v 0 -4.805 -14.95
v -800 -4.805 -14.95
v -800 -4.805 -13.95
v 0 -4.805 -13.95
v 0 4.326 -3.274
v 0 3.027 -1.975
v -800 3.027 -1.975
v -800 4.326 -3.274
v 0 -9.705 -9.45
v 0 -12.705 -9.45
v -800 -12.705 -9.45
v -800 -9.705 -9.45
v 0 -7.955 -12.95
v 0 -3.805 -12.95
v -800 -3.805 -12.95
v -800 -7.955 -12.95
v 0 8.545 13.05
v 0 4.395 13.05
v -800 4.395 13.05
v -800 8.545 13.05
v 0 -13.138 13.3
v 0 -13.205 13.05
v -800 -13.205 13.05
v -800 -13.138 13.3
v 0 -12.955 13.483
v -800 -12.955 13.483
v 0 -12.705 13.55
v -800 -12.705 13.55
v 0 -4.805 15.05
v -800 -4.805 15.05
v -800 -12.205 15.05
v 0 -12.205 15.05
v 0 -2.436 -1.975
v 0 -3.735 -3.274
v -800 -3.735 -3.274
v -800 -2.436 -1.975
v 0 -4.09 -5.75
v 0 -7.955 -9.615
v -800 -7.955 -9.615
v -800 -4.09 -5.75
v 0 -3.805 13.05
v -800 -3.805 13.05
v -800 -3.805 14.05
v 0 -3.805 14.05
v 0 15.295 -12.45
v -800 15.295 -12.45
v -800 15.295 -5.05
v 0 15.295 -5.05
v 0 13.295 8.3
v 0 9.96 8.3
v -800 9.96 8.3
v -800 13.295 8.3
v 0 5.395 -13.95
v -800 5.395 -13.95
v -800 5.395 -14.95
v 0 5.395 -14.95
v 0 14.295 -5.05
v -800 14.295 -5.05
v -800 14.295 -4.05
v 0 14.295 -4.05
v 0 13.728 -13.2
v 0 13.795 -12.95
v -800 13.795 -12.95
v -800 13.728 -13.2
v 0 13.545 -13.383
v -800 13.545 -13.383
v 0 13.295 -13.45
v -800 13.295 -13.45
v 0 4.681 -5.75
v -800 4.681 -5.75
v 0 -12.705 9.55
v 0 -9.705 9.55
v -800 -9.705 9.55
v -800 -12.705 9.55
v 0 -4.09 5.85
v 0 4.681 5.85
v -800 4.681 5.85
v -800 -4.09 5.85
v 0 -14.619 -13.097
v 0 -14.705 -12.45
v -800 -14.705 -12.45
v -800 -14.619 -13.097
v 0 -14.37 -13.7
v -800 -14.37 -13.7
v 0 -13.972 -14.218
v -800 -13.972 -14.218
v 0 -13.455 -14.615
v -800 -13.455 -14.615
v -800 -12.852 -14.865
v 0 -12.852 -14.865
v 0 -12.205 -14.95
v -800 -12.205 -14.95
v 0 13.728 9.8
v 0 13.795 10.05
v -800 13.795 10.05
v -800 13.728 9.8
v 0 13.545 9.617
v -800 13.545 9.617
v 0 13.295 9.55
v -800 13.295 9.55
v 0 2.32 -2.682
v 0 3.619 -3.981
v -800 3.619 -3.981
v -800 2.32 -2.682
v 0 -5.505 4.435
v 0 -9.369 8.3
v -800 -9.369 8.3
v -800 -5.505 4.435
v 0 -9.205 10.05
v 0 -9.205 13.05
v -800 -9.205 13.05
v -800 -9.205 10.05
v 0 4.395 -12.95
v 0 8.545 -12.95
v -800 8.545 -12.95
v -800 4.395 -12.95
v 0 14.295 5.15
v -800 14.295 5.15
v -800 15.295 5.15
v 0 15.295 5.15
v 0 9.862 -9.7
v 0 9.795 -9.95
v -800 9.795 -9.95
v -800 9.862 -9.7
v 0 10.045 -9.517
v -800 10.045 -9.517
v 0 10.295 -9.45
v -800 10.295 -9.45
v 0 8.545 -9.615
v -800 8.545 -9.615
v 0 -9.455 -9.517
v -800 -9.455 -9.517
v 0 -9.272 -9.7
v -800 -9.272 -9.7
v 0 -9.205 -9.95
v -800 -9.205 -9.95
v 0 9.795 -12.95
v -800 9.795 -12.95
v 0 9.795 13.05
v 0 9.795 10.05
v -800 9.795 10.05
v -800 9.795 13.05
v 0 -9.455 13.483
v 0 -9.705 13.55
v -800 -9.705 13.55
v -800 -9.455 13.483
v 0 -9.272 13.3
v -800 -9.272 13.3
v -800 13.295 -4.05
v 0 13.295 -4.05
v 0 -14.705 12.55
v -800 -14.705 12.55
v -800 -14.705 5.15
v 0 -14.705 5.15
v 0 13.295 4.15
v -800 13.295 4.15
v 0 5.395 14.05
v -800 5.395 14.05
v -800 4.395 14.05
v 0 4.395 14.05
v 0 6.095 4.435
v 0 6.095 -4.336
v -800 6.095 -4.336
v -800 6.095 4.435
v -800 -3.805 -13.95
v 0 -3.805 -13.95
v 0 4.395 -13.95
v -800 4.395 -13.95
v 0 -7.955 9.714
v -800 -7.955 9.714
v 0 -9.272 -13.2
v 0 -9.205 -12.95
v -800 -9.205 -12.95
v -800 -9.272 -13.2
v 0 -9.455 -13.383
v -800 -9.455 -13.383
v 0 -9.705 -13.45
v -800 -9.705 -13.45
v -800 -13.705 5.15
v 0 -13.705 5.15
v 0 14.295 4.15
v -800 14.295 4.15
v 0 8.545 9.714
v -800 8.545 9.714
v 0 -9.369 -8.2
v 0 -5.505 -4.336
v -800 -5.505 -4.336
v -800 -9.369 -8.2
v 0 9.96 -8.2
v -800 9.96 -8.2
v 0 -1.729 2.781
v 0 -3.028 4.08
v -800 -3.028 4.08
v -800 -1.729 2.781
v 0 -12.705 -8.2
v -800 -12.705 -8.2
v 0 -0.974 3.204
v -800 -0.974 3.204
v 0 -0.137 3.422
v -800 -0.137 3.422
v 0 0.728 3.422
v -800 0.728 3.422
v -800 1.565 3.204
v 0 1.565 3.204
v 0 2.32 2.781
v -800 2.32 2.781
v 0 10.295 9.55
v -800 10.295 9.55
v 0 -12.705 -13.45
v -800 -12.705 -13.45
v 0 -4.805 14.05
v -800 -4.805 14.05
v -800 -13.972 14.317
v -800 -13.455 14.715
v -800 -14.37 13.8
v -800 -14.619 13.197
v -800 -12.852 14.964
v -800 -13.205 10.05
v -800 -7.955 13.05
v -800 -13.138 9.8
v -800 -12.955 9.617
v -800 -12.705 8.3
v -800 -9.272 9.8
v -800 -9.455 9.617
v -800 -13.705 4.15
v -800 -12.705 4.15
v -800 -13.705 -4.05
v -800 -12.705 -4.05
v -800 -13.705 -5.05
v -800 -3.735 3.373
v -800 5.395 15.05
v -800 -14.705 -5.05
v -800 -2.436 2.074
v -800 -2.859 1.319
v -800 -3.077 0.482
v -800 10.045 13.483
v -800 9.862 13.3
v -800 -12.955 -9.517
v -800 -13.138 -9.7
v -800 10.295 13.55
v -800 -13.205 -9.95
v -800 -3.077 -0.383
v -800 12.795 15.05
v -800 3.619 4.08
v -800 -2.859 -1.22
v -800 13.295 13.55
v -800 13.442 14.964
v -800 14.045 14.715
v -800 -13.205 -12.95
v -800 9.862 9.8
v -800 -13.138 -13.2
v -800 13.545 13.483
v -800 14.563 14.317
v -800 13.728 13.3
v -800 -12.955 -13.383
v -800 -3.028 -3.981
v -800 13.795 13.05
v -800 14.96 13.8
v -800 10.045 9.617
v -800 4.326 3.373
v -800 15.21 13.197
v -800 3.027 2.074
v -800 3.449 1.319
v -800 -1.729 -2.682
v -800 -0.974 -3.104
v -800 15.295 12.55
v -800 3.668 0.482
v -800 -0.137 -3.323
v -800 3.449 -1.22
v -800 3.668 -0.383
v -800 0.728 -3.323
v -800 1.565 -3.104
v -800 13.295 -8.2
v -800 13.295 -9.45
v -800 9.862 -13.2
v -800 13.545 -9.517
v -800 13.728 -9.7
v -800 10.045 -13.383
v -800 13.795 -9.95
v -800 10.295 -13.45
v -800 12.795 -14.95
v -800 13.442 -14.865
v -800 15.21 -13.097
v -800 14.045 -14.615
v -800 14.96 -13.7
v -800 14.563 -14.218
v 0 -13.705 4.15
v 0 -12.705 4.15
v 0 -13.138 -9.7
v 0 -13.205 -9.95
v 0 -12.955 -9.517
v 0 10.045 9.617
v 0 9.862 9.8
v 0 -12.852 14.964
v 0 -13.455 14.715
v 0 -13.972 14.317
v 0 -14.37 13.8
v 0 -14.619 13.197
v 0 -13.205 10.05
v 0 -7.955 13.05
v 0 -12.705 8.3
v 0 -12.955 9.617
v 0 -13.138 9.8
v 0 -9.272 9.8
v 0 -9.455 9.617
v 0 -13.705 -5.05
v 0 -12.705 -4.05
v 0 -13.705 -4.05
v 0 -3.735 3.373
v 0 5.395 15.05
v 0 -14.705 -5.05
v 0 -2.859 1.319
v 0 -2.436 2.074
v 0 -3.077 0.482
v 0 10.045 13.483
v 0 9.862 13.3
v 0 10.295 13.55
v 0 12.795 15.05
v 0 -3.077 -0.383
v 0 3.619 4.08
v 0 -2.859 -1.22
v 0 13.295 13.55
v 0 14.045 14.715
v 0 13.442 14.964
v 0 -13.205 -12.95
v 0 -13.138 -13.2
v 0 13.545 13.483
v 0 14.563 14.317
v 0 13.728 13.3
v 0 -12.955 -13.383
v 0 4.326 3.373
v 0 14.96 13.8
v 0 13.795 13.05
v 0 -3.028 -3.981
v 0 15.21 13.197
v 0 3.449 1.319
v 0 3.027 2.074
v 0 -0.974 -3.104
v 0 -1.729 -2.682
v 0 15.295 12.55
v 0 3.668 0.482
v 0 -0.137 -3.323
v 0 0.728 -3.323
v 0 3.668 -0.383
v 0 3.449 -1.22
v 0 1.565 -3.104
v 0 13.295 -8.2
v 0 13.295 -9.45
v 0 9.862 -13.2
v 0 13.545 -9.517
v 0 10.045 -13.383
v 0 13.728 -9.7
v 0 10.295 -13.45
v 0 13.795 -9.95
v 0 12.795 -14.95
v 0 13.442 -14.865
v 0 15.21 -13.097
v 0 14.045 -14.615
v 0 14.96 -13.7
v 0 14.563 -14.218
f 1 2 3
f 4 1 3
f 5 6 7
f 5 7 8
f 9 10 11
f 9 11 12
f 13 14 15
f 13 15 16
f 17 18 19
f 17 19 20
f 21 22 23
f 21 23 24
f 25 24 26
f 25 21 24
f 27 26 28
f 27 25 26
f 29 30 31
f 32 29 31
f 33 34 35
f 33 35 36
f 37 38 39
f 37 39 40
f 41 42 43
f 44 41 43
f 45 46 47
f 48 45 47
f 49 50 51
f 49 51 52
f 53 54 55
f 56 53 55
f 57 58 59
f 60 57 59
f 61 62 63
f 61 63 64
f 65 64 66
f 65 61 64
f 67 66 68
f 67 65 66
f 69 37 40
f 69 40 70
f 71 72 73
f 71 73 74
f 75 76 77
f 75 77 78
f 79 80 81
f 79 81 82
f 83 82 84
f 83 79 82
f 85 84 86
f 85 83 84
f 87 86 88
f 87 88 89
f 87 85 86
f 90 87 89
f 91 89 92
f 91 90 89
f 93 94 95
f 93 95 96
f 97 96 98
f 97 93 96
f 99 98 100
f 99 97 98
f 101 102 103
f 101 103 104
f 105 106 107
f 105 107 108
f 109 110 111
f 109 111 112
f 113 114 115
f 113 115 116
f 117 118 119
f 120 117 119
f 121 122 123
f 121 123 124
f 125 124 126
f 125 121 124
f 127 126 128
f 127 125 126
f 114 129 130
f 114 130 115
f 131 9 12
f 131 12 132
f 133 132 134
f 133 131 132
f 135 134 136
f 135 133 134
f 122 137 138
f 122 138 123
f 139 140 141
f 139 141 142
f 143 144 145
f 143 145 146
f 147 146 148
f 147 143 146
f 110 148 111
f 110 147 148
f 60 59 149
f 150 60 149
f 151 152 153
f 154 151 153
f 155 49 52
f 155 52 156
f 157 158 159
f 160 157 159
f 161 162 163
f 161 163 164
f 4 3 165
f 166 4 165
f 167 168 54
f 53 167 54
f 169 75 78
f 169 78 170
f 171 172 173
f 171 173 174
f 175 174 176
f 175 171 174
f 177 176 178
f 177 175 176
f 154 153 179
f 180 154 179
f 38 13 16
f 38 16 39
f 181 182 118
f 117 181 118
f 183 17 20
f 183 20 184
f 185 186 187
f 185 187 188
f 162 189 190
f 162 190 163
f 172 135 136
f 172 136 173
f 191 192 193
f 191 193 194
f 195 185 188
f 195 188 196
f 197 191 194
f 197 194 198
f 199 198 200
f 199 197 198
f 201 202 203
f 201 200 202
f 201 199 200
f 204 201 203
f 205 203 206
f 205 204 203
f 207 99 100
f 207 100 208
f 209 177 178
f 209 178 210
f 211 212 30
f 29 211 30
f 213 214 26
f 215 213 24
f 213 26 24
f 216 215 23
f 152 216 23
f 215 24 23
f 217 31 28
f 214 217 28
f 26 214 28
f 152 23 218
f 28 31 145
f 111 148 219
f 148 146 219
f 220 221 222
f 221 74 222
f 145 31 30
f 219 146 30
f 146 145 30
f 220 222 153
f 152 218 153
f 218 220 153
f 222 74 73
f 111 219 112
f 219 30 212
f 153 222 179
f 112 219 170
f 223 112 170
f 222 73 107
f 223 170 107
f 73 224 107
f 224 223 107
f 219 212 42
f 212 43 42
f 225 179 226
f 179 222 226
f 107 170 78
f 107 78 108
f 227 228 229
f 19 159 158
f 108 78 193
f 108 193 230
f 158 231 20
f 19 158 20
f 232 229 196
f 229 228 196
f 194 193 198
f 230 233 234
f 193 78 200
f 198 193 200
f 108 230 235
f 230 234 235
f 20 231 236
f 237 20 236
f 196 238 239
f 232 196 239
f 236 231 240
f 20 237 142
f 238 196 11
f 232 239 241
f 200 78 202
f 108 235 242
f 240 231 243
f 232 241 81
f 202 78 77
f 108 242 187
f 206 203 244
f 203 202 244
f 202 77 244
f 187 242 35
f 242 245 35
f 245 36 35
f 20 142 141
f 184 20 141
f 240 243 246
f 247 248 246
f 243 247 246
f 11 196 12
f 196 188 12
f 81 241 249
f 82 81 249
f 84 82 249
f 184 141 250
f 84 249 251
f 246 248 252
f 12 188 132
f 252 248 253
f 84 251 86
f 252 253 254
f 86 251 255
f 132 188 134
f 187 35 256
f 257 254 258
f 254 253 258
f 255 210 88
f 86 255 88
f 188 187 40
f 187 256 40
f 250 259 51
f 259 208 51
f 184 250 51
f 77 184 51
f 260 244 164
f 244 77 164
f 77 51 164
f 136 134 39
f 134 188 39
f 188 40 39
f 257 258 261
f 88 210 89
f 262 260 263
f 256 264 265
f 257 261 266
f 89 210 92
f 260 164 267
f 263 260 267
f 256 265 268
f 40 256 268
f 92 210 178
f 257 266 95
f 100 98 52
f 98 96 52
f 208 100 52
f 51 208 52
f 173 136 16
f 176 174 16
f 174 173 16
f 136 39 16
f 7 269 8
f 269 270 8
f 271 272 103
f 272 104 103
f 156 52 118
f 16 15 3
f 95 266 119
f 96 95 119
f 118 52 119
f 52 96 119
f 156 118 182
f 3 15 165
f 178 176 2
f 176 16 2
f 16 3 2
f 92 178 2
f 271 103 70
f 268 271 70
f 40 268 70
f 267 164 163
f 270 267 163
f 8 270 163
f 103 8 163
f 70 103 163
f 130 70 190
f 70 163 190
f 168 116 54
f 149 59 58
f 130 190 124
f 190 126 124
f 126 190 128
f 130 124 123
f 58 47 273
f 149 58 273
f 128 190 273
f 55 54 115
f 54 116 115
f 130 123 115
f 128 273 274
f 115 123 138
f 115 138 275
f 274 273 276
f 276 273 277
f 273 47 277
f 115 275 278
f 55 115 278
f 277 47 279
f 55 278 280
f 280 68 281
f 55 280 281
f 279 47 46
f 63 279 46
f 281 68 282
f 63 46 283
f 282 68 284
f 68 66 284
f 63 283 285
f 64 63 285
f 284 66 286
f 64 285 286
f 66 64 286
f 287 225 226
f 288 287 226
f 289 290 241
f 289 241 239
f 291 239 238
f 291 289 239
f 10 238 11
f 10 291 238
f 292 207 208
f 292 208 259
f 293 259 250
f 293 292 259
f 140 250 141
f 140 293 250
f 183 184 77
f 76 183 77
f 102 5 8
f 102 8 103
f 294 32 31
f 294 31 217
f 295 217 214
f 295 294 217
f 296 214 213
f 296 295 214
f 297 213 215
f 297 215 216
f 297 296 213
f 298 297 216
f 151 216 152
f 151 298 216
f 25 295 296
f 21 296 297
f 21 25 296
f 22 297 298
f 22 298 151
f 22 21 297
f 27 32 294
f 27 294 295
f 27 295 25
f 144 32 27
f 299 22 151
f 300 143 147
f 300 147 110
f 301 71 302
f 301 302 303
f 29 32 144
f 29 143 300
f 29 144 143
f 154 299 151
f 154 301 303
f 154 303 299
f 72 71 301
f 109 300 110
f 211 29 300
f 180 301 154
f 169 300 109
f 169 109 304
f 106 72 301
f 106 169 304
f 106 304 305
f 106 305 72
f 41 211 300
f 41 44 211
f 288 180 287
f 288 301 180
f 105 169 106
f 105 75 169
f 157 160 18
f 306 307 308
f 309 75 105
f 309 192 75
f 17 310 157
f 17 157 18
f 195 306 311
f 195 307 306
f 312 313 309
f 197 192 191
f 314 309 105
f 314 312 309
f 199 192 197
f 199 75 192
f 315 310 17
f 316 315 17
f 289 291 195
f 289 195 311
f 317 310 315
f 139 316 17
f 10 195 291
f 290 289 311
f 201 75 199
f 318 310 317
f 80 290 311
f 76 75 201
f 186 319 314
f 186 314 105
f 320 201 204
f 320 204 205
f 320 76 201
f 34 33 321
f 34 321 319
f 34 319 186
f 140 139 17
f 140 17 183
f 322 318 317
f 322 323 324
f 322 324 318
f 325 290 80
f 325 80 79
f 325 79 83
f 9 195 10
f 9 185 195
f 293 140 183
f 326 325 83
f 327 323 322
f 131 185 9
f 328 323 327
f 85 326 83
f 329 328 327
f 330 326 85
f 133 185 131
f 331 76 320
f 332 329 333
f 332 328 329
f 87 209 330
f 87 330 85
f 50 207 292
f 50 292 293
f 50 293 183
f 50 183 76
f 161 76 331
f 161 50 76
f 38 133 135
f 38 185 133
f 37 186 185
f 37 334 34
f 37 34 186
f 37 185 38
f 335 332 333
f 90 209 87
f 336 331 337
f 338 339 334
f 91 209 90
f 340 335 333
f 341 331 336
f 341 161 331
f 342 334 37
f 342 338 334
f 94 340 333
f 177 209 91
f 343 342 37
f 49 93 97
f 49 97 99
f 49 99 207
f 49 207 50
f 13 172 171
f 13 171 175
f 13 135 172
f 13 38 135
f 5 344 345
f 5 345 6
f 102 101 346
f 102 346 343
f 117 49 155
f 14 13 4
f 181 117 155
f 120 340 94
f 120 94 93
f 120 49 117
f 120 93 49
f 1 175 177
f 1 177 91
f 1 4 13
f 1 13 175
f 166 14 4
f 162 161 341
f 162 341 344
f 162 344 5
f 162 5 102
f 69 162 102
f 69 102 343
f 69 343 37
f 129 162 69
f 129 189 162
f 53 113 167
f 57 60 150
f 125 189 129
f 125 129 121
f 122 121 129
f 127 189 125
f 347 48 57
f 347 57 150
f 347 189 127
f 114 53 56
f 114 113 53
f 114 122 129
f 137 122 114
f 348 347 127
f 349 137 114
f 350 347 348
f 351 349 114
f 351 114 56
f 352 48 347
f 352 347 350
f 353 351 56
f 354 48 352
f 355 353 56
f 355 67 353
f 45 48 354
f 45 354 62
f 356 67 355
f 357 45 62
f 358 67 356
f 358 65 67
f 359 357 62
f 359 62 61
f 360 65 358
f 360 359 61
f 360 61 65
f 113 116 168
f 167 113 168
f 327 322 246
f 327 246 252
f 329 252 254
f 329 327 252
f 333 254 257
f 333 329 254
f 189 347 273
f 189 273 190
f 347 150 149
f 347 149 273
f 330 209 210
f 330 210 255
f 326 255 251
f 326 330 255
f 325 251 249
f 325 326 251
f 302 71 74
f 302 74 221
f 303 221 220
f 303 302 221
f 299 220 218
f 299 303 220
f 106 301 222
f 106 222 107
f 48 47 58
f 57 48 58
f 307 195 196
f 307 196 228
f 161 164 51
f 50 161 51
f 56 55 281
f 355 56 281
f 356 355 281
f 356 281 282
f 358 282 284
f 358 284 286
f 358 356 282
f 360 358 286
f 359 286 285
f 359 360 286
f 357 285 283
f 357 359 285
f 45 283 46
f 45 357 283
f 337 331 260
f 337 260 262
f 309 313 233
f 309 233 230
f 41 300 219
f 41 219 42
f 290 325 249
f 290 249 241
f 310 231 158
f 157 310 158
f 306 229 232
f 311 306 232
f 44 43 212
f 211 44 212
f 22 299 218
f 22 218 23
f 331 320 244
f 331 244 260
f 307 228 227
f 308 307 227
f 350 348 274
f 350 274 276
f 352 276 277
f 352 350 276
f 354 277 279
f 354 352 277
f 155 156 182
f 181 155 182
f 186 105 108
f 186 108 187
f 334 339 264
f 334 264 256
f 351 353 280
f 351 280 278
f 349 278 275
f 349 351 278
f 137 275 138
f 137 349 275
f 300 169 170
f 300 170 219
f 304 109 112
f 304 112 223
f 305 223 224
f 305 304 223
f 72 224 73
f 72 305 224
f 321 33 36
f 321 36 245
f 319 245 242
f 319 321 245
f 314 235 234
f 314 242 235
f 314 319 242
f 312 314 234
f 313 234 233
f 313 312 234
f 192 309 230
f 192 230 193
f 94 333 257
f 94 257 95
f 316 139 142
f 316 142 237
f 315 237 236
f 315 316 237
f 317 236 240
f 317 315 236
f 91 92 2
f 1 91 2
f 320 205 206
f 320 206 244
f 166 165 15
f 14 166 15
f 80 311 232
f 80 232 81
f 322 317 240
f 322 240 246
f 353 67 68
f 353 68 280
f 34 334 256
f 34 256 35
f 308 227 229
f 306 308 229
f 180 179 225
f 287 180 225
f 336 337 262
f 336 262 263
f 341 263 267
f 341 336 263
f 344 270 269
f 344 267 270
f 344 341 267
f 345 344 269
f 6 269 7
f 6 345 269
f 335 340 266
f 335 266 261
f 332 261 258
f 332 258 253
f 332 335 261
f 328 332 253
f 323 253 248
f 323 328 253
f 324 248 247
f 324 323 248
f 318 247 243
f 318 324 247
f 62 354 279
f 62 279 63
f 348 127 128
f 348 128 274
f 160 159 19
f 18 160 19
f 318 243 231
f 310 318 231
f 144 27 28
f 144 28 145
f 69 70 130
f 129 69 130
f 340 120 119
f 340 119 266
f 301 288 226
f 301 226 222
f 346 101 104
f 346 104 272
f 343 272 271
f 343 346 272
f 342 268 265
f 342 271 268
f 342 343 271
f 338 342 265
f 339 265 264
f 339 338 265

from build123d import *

# Parameters (mm, degrees)
EXTRUDE_1_DEPTH = 50
EXTRUDE_2_DEPTH = 800


with BuildPart() as part:
    # 草图1 → 凸台-拉伸1 (new body)
    with BuildSketch(Plane(origin=(0, 0, 0), x_dir=(0, 0, -1), z_dir=(1, 0, 0))):
        with BuildLine():
            Line((-5.14957074, -13.70467014), (-4.14957074, -13.70467014))
            Line((-4.14957074, -13.70467014), (-4.14957074, -12.70467014))
            Line((-4.14957074, -12.70467014), (-8.29957074, -12.70467014))
            Line((-8.29957074, -12.70467014), (-8.29957074, -9.3688837))
            Line((-8.29957074, -9.3688837), (-4.43535718, -5.50467014))
            Line((-4.43535718, -5.50467014), (4.3362157, -5.50467014))
            Line((4.3362157, -5.50467014), (8.20042926, -9.3688837))
            Line((8.20042926, -9.3688837), (8.20042926, -12.70467014))
            Line((8.20042926, -12.70467014), (4.05042926, -12.70467014))
            Line((4.05042926, -12.70467014), (4.05042926, -13.70467014))
            Line((4.05042926, -13.70467014), (5.05042926, -13.70467014))
            Line((5.05042926, -13.70467014), (5.05042926, -14.70467014))
            Line((5.05042926, -14.70467014), (12.45042926, -14.70467014))
            ThreePointArc((12.45042926, -14.70467014), (14.218196213, -13.972437093), (14.95042926, -12.20467014))
            Line((14.95042926, -12.20467014), (14.95042926, -4.80467014))
            Line((14.95042926, -4.80467014), (13.95042926, -4.80467014))
            Line((13.95042926, -4.80467014), (13.95042926, -3.80467014))
            Line((13.95042926, -3.80467014), (12.95042926, -3.80467014))
            Line((12.95042926, -3.80467014), (12.95042926, -7.95467014))
            Line((12.95042926, -7.95467014), (9.61464282, -7.95467014))
            Line((9.61464282, -7.95467014), (5.75042926, -4.09045658))
            Line((5.75042926, -4.09045658), (5.75042926, 4.6811163))
            Line((5.75042926, 4.6811163), (9.61464282, 8.54532986))
            Line((9.61464282, 8.54532986), (12.95042926, 8.54532986))
            Line((12.95042926, 8.54532986), (12.95042926, 4.39532986))
            Line((12.95042926, 4.39532986), (13.95042926, 4.39532986))
            Line((13.95042926, 4.39532986), (13.95042926, 5.39532986))
            Line((13.95042926, 5.39532986), (14.95042926, 5.39532986))
            Line((14.95042926, 5.39532986), (14.95042926, 12.79532986))
            ThreePointArc((14.95042926, 12.79532986), (14.218196213, 14.563096813), (12.45042926, 15.29532986))
            Line((12.45042926, 15.29532986), (5.05042926, 15.29532986))
            Line((5.05042926, 15.29532986), (5.05042926, 14.29532986))
            Line((5.05042926, 14.29532986), (4.05042926, 14.29532986))
            Line((4.05042926, 14.29532986), (4.05042926, 13.29532986))
            Line((4.05042926, 13.29532986), (8.20042926, 13.29532986))
            Line((8.20042926, 13.29532986), (8.20042926, 9.95954342))
            Line((8.20042926, 9.95954342), (4.3362157, 6.09532986))
            Line((4.3362157, 6.09532986), (-4.43535718, 6.09532986))
            Line((-4.43535718, 6.09532986), (-8.29957074, 9.95954342))
            Line((-8.29957074, 9.95954342), (-8.29957074, 13.29532986))
            Line((-8.29957074, 13.29532986), (-4.14957074, 13.29532986))
            Line((-4.14957074, 13.29532986), (-4.14957074, 14.29532986))
            Line((-4.14957074, 14.29532986), (-5.14957074, 14.29532986))
            Line((-5.14957074, 14.29532986), (-5.14957074, 15.29532986))
            Line((-5.14957074, 15.29532986), (-12.54957074, 15.29532986))
            ThreePointArc((-12.54957074, 15.29532986), (-14.317337693, 14.563096813), (-15.04957074, 12.79532986))
            Line((-15.04957074, 12.79532986), (-15.04957074, 5.39532986))
            Line((-15.04957074, 5.39532986), (-14.04957074, 5.39532986))
            Line((-14.04957074, 5.39532986), (-14.04957074, 4.39532986))
            Line((-14.04957074, 4.39532986), (-13.04957074, 4.39532986))
            Line((-13.04957074, 4.39532986), (-13.04957074, 8.54532986))
            Line((-13.04957074, 8.54532986), (-9.7137843, 8.54532986))
            Line((-9.7137843, 8.54532986), (-5.84957074, 4.6811163))
            Line((-5.84957074, 4.6811163), (-5.84957074, -4.09045658))
            Line((-5.84957074, -4.09045658), (-9.7137843, -7.95467014))
            Line((-9.7137843, -7.95467014), (-13.04957074, -7.95467014))
            Line((-13.04957074, -7.95467014), (-13.04957074, -3.80467014))
            Line((-13.04957074, -3.80467014), (-14.04957074, -3.80467014))
            Line((-14.04957074, -3.80467014), (-14.04957074, -4.80467014))
            Line((-14.04957074, -4.80467014), (-15.04957074, -4.80467014))
            Line((-15.04957074, -4.80467014), (-15.04957074, -12.20467014))
            ThreePointArc((-15.04957074, -12.20467014), (-14.317337693, -13.972437093), (-12.54957074, -14.70467014))
            Line((-12.54957074, -14.70467014), (-5.14957074, -14.70467014))
            Line((-5.14957074, -14.70467014), (-5.14957074, -13.70467014))
        make_face()
        with BuildLine():
            Line((-10.04957074, 9.79532986), (-13.04957074, 9.79532986))
            ThreePointArc((-13.04957074, 9.79532986), (-13.403124131, 9.941776469), (-13.54957074, 10.29532986))
            Line((-13.54957074, 10.29532986), (-13.54957074, 13.29532986))
            ThreePointArc((-13.54957074, 13.29532986), (-13.403124131, 13.648883251), (-13.04957074, 13.79532986))
            Line((-13.04957074, 13.79532986), (-10.04957074, 13.79532986))
            ThreePointArc((-10.04957074, 13.79532986), (-9.696017349, 13.648883251), (-9.54957074, 13.29532986))
            Line((-9.54957074, 13.29532986), (-9.54957074, 10.29532986))
            ThreePointArc((-9.54957074, 10.29532986), (-9.696017349, 9.941776469), (-10.04957074, 9.79532986))
        make_face(mode=Mode.SUBTRACT)
        with BuildLine():
            Line((-10.04957074, -13.20467014), (-13.04957074, -13.20467014))
            ThreePointArc((-13.04957074, -13.20467014), (-13.403124131, -13.058223531), (-13.54957074, -12.70467014))
            Line((-13.54957074, -12.70467014), (-13.54957074, -9.70467014))
            ThreePointArc((-13.54957074, -9.70467014), (-13.403124131, -9.351116749), (-13.04957074, -9.20467014))
            Line((-13.04957074, -9.20467014), (-10.04957074, -9.20467014))
            ThreePointArc((-10.04957074, -9.20467014), (-9.696017349, -9.351116749), (-9.54957074, -9.70467014))
            Line((-9.54957074, -9.70467014), (-9.54957074, -12.70467014))
            ThreePointArc((-9.54957074, -12.70467014), (-9.696017349, -13.058223531), (-10.04957074, -13.20467014))
        make_face(mode=Mode.SUBTRACT)
        with BuildLine():
            Line((12.95042926, 9.79532986), (9.95042926, 9.79532986))
            ThreePointArc((9.95042926, 9.79532986), (9.596875869, 9.941776469), (9.45042926, 10.29532986))
            Line((9.45042926, 10.29532986), (9.45042926, 13.29532986))
            ThreePointArc((9.45042926, 13.29532986), (9.596875869, 13.648883251), (9.95042926, 13.79532986))
            Line((9.95042926, 13.79532986), (12.95042926, 13.79532986))
            ThreePointArc((12.95042926, 13.79532986), (13.303982651, 13.648883251), (13.45042926, 13.29532986))
            Line((13.45042926, 13.29532986), (13.45042926, 10.29532986))
            ThreePointArc((13.45042926, 10.29532986), (13.303982651, 9.941776469), (12.95042926, 9.79532986))
        make_face(mode=Mode.SUBTRACT)
        with BuildLine():
            Line((13.45042926, -9.70467014), (13.45042926, -12.70467014))
            ThreePointArc((13.45042926, -12.70467014), (13.303982651, -13.058223531), (12.95042926, -13.20467014))
            Line((12.95042926, -13.20467014), (9.95042926, -13.20467014))
            ThreePointArc((9.95042926, -13.20467014), (9.596875869, -13.058223531), (9.45042926, -12.70467014))
            Line((9.45042926, -12.70467014), (9.45042926, -9.70467014))
            ThreePointArc((9.45042926, -9.70467014), (9.596875869, -9.351116749), (9.95042926, -9.20467014))
            Line((9.95042926, -9.20467014), (12.95042926, -9.20467014))
            ThreePointArc((12.95042926, -9.20467014), (13.303982651, -9.351116749), (13.45042926, -9.70467014))
        make_face(mode=Mode.SUBTRACT)
        with BuildLine():
            Line((-4.07998961, 3.61864195), (-3.37288283, 4.32574873))
            Line((-3.37288283, 4.32574873), (-2.07404174, 3.02690764))
            ThreePointArc((-2.07404174, 3.02690764), (-0.04957074, 3.69532986), (1.97490026, 3.02690764))
            Line((1.97490026, 3.02690764), (3.27374135, 4.32574873))
            Line((3.27374135, 4.32574873), (3.98084813, 3.61864195))
            Line((3.98084813, 3.61864195), (2.68200704, 2.31980086))
            ThreePointArc((2.68200704, 2.31980086), (3.35042926, 0.29532986), (2.68200704, -1.72914114))
            Line((2.68200704, -1.72914114), (3.98084813, -3.02798223))
            Line((3.98084813, -3.02798223), (3.27374135, -3.73508901))
            Line((3.27374135, -3.73508901), (1.97490026, -2.43624792))
            ThreePointArc((1.97490026, -2.43624792), (-0.04957074, -3.10467014), (-2.07404174, -2.43624792))
            Line((-2.07404174, -2.43624792), (-3.37288283, -3.73508901))
            Line((-3.37288283, -3.73508901), (-4.07998961, -3.02798223))
            Line((-4.07998961, -3.02798223), (-2.78114852, -1.72914114))
            ThreePointArc((-2.78114852, -1.72914114), (-3.44957074, 0.29532986), (-2.78114852, 2.31980086))
            Line((-2.78114852, 2.31980086), (-4.07998961, 3.61864195))
        make_face(mode=Mode.SUBTRACT)
    extrude(amount=-EXTRUDE_1_DEPTH)

    # 草图2 → 凸台-拉伸2 (add)
    with BuildSketch(Plane(origin=(0, 0, 0), x_dir=(0, 0, -1), z_dir=(1, 0, 0))):
        with BuildLine():
            Line((-15.04957074, -4.80467014), (-15.04957074, -12.20467014))
            ThreePointArc((-15.04957074, -12.20467014), (-14.317337693, -13.972437093), (-12.54957074, -14.70467014))
            Line((-12.54957074, -14.70467014), (-5.14957074, -14.70467014))
            Line((-5.14957074, -14.70467014), (-5.14957074, -13.70467014))
            Line((-5.14957074, -13.70467014), (-4.14957074, -13.70467014))
            Line((-4.14957074, -13.70467014), (-4.14957074, -12.70467014))
            Line((-4.14957074, -12.70467014), (-8.29957074, -12.70467014))
            Line((-8.29957074, -12.70467014), (-8.29957074, -9.3688837))
            Line((-8.29957074, -9.3688837), (-4.43535718, -5.50467014))
            Line((-4.43535718, -5.50467014), (4.3362157, -5.50467014))
            Line((4.3362157, -5.50467014), (8.20042926, -9.3688837))
            Line((8.20042926, -9.3688837), (8.20042926, -12.70467014))
            Line((8.20042926, -12.70467014), (4.05042926, -12.70467014))
            Line((4.05042926, -12.70467014), (4.05042926, -13.70467014))
            Line((4.05042926, -13.70467014), (5.05042926, -13.70467014))
            Line((5.05042926, -13.70467014), (5.05042926, -14.70467014))
            Line((5.05042926, -14.70467014), (12.45042926, -14.70467014))
            ThreePointArc((12.45042926, -14.70467014), (14.218196213, -13.972437093), (14.95042926, -12.20467014))
            Line((14.95042926, -12.20467014), (14.95042926, -4.80467014))
            Line((14.95042926, -4.80467014), (13.95042926, -4.80467014))
            Line((13.95042926, -4.80467014), (13.95042926, -3.80467014))
            Line((13.95042926, -3.80467014), (12.95042926, -3.80467014))
            Line((12.95042926, -3.80467014), (12.95042926, -7.95467014))
            Line((12.95042926, -7.95467014), (9.61464282, -7.95467014))
            Line((9.61464282, -7.95467014), (5.75042926, -4.09045658))
            Line((5.75042926, -4.09045658), (5.75042926, 4.6811163))
            Line((5.75042926, 4.6811163), (9.61464282, 8.54532986))
            Line((9.61464282, 8.54532986), (12.95042926, 8.54532986))
            Line((12.95042926, 8.54532986), (12.95042926, 4.39532986))
            Line((12.95042926, 4.39532986), (13.95042926, 4.39532986))
            Line((13.95042926, 4.39532986), (13.95042926, 5.39532986))
            Line((13.95042926, 5.39532986), (14.95042926, 5.39532986))
            Line((14.95042926, 5.39532986), (14.95042926, 12.79532986))
            ThreePointArc((14.95042926, 12.79532986), (14.218196213, 14.563096813), (12.45042926, 15.29532986))
            Line((12.45042926, 15.29532986), (5.05042926, 15.29532986))
            Line((5.05042926, 15.29532986), (5.05042926, 14.29532986))
            Line((5.05042926, 14.29532986), (4.05042926, 14.29532986))
            Line((4.05042926, 14.29532986), (4.05042926, 13.29532986))
            Line((4.05042926, 13.29532986), (8.20042926, 13.29532986))
            Line((8.20042926, 13.29532986), (8.20042926, 9.95954342))
            Line((8.20042926, 9.95954342), (4.3362157, 6.09532986))
            Line((4.3362157, 6.09532986), (-4.43535718, 6.09532986))
            Line((-4.43535718, 6.09532986), (-8.29957074, 9.95954342))
            Line((-8.29957074, 9.95954342), (-8.29957074, 13.29532986))
            Line((-8.29957074, 13.29532986), (-4.14957074, 13.29532986))
            Line((-4.14957074, 13.29532986), (-4.14957074, 14.29532986))
            Line((-4.14957074, 14.29532986), (-5.14957074, 14.29532986))
            Line((-5.14957074, 14.29532986), (-5.14957074, 15.29532986))
            Line((-5.14957074, 15.29532986), (-12.54957074, 15.29532986))
            ThreePointArc((-12.54957074, 15.29532986), (-14.317337693, 14.563096813), (-15.04957074, 12.79532986))
            Line((-15.04957074, 12.79532986), (-15.04957074, 5.39532986))
            Line((-15.04957074, 5.39532986), (-14.04957074, 5.39532986))
            Line((-14.04957074, 5.39532986), (-14.04957074, 4.39532986))
            Line((-14.04957074, 4.39532986), (-13.04957074, 4.39532986))
            Line((-13.04957074, 4.39532986), (-13.04957074, 8.54532986))
            Line((-13.04957074, 8.54532986), (-9.7137843, 8.54532986))
            Line((-9.7137843, 8.54532986), (-5.84957074, 4.6811163))
            Line((-5.84957074, 4.6811163), (-5.84957074, -4.09045658))
            Line((-5.84957074, -4.09045658), (-9.7137843, -7.95467014))
            Line((-9.7137843, -7.95467014), (-13.04957074, -7.95467014))
            Line((-13.04957074, -7.95467014), (-13.04957074, -3.80467014))
            Line((-13.04957074, -3.80467014), (-14.04957074, -3.80467014))
            Line((-14.04957074, -3.80467014), (-14.04957074, -4.80467014))
            Line((-14.04957074, -4.80467014), (-15.04957074, -4.80467014))
        make_face()
        with BuildLine():
            Line((-13.04957074, 9.79532986), (-10.04957074, 9.79532986))
            ThreePointArc((-10.04957074, 9.79532986), (-9.696017349, 9.941776469), (-9.54957074, 10.29532986))
            Line((-9.54957074, 10.29532986), (-9.54957074, 13.29532986))
            ThreePointArc((-9.54957074, 13.29532986), (-9.696017349, 13.648883251), (-10.04957074, 13.79532986))
            Line((-10.04957074, 13.79532986), (-13.04957074, 13.79532986))
            ThreePointArc((-13.04957074, 13.79532986), (-13.403124131, 13.648883251), (-13.54957074, 13.29532986))
            Line((-13.54957074, 13.29532986), (-13.54957074, 10.29532986))
            ThreePointArc((-13.54957074, 10.29532986), (-13.403124131, 9.941776469), (-13.04957074, 9.79532986))
        make_face(mode=Mode.SUBTRACT)
        with BuildLine():
            Line((-13.04957074, -13.20467014), (-10.04957074, -13.20467014))
            ThreePointArc((-10.04957074, -13.20467014), (-9.696017349, -13.058223531), (-9.54957074, -12.70467014))
            Line((-9.54957074, -12.70467014), (-9.54957074, -9.70467014))
            ThreePointArc((-9.54957074, -9.70467014), (-9.696017349, -9.351116749), (-10.04957074, -9.20467014))
            Line((-10.04957074, -9.20467014), (-13.04957074, -9.20467014))
            ThreePointArc((-13.04957074, -9.20467014), (-13.403124131, -9.351116749), (-13.54957074, -9.70467014))
            Line((-13.54957074, -9.70467014), (-13.54957074, -12.70467014))
            ThreePointArc((-13.54957074, -12.70467014), (-13.403124131, -13.058223531), (-13.04957074, -13.20467014))
        make_face(mode=Mode.SUBTRACT)
        with BuildLine():
            Line((9.45042926, 13.29532986), (9.45042926, 10.29532986))
            ThreePointArc((9.45042926, 10.29532986), (9.596875869, 9.941776469), (9.95042926, 9.79532986))
            Line((9.95042926, 9.79532986), (12.95042926, 9.79532986))
            ThreePointArc((12.95042926, 9.79532986), (13.303982651, 9.941776469), (13.45042926, 10.29532986))
            Line((13.45042926, 10.29532986), (13.45042926, 13.29532986))
            ThreePointArc((13.45042926, 13.29532986), (13.303982651, 13.648883251), (12.95042926, 13.79532986))
            Line((12.95042926, 13.79532986), (9.95042926, 13.79532986))
            ThreePointArc((9.95042926, 13.79532986), (9.596875869, 13.648883251), (9.45042926, 13.29532986))
        make_face(mode=Mode.SUBTRACT)
        with BuildLine():
            Line((9.45042926, -9.70467014), (9.45042926, -12.70467014))
            ThreePointArc((9.45042926, -12.70467014), (9.596875869, -13.058223531), (9.95042926, -13.20467014))
            Line((9.95042926, -13.20467014), (12.95042926, -13.20467014))
            ThreePointArc((12.95042926, -13.20467014), (13.303982651, -13.058223531), (13.45042926, -12.70467014))
            Line((13.45042926, -12.70467014), (13.45042926, -9.70467014))
            ThreePointArc((13.45042926, -9.70467014), (13.303982651, -9.351116749), (12.95042926, -9.20467014))
            Line((12.95042926, -9.20467014), (9.95042926, -9.20467014))
            ThreePointArc((9.95042926, -9.20467014), (9.596875869, -9.351116749), (9.45042926, -9.70467014))
        make_face(mode=Mode.SUBTRACT)
        with BuildLine():
            Line((-3.37288283, -3.73508901), (-2.07404174, -2.43624792))
            ThreePointArc((-2.07404174, -2.43624792), (-0.04957074, -3.10467014), (1.97490026, -2.43624792))
            Line((1.97490026, -2.43624792), (3.27374135, -3.73508901))
            Line((3.27374135, -3.73508901), (3.98084813, -3.02798223))
            Line((3.98084813, -3.02798223), (2.68200704, -1.72914114))
            ThreePointArc((2.68200704, -1.72914114), (3.35042926, 0.29532986), (2.68200704, 2.31980086))
            Line((2.68200704, 2.31980086), (3.98084813, 3.61864195))
            Line((3.98084813, 3.61864195), (3.27374135, 4.32574873))
            Line((3.27374135, 4.32574873), (1.97490026, 3.02690764))
            ThreePointArc((1.97490026, 3.02690764), (-0.04957074, 3.69532986), (-2.07404174, 3.02690764))
            Line((-2.07404174, 3.02690764), (-3.37288283, 4.32574873))
            Line((-3.37288283, 4.32574873), (-4.07998961, 3.61864195))
            Line((-4.07998961, 3.61864195), (-2.78114852, 2.31980086))
            ThreePointArc((-2.78114852, 2.31980086), (-3.44957074, 0.29532986), (-2.78114852, -1.72914114))
            Line((-2.78114852, -1.72914114), (-4.07998961, -3.02798223))
            Line((-4.07998961, -3.02798223), (-3.37288283, -3.73508901))
        make_face(mode=Mode.SUBTRACT)
    extrude(amount=-EXTRUDE_2_DEPTH)


solid = part.part
